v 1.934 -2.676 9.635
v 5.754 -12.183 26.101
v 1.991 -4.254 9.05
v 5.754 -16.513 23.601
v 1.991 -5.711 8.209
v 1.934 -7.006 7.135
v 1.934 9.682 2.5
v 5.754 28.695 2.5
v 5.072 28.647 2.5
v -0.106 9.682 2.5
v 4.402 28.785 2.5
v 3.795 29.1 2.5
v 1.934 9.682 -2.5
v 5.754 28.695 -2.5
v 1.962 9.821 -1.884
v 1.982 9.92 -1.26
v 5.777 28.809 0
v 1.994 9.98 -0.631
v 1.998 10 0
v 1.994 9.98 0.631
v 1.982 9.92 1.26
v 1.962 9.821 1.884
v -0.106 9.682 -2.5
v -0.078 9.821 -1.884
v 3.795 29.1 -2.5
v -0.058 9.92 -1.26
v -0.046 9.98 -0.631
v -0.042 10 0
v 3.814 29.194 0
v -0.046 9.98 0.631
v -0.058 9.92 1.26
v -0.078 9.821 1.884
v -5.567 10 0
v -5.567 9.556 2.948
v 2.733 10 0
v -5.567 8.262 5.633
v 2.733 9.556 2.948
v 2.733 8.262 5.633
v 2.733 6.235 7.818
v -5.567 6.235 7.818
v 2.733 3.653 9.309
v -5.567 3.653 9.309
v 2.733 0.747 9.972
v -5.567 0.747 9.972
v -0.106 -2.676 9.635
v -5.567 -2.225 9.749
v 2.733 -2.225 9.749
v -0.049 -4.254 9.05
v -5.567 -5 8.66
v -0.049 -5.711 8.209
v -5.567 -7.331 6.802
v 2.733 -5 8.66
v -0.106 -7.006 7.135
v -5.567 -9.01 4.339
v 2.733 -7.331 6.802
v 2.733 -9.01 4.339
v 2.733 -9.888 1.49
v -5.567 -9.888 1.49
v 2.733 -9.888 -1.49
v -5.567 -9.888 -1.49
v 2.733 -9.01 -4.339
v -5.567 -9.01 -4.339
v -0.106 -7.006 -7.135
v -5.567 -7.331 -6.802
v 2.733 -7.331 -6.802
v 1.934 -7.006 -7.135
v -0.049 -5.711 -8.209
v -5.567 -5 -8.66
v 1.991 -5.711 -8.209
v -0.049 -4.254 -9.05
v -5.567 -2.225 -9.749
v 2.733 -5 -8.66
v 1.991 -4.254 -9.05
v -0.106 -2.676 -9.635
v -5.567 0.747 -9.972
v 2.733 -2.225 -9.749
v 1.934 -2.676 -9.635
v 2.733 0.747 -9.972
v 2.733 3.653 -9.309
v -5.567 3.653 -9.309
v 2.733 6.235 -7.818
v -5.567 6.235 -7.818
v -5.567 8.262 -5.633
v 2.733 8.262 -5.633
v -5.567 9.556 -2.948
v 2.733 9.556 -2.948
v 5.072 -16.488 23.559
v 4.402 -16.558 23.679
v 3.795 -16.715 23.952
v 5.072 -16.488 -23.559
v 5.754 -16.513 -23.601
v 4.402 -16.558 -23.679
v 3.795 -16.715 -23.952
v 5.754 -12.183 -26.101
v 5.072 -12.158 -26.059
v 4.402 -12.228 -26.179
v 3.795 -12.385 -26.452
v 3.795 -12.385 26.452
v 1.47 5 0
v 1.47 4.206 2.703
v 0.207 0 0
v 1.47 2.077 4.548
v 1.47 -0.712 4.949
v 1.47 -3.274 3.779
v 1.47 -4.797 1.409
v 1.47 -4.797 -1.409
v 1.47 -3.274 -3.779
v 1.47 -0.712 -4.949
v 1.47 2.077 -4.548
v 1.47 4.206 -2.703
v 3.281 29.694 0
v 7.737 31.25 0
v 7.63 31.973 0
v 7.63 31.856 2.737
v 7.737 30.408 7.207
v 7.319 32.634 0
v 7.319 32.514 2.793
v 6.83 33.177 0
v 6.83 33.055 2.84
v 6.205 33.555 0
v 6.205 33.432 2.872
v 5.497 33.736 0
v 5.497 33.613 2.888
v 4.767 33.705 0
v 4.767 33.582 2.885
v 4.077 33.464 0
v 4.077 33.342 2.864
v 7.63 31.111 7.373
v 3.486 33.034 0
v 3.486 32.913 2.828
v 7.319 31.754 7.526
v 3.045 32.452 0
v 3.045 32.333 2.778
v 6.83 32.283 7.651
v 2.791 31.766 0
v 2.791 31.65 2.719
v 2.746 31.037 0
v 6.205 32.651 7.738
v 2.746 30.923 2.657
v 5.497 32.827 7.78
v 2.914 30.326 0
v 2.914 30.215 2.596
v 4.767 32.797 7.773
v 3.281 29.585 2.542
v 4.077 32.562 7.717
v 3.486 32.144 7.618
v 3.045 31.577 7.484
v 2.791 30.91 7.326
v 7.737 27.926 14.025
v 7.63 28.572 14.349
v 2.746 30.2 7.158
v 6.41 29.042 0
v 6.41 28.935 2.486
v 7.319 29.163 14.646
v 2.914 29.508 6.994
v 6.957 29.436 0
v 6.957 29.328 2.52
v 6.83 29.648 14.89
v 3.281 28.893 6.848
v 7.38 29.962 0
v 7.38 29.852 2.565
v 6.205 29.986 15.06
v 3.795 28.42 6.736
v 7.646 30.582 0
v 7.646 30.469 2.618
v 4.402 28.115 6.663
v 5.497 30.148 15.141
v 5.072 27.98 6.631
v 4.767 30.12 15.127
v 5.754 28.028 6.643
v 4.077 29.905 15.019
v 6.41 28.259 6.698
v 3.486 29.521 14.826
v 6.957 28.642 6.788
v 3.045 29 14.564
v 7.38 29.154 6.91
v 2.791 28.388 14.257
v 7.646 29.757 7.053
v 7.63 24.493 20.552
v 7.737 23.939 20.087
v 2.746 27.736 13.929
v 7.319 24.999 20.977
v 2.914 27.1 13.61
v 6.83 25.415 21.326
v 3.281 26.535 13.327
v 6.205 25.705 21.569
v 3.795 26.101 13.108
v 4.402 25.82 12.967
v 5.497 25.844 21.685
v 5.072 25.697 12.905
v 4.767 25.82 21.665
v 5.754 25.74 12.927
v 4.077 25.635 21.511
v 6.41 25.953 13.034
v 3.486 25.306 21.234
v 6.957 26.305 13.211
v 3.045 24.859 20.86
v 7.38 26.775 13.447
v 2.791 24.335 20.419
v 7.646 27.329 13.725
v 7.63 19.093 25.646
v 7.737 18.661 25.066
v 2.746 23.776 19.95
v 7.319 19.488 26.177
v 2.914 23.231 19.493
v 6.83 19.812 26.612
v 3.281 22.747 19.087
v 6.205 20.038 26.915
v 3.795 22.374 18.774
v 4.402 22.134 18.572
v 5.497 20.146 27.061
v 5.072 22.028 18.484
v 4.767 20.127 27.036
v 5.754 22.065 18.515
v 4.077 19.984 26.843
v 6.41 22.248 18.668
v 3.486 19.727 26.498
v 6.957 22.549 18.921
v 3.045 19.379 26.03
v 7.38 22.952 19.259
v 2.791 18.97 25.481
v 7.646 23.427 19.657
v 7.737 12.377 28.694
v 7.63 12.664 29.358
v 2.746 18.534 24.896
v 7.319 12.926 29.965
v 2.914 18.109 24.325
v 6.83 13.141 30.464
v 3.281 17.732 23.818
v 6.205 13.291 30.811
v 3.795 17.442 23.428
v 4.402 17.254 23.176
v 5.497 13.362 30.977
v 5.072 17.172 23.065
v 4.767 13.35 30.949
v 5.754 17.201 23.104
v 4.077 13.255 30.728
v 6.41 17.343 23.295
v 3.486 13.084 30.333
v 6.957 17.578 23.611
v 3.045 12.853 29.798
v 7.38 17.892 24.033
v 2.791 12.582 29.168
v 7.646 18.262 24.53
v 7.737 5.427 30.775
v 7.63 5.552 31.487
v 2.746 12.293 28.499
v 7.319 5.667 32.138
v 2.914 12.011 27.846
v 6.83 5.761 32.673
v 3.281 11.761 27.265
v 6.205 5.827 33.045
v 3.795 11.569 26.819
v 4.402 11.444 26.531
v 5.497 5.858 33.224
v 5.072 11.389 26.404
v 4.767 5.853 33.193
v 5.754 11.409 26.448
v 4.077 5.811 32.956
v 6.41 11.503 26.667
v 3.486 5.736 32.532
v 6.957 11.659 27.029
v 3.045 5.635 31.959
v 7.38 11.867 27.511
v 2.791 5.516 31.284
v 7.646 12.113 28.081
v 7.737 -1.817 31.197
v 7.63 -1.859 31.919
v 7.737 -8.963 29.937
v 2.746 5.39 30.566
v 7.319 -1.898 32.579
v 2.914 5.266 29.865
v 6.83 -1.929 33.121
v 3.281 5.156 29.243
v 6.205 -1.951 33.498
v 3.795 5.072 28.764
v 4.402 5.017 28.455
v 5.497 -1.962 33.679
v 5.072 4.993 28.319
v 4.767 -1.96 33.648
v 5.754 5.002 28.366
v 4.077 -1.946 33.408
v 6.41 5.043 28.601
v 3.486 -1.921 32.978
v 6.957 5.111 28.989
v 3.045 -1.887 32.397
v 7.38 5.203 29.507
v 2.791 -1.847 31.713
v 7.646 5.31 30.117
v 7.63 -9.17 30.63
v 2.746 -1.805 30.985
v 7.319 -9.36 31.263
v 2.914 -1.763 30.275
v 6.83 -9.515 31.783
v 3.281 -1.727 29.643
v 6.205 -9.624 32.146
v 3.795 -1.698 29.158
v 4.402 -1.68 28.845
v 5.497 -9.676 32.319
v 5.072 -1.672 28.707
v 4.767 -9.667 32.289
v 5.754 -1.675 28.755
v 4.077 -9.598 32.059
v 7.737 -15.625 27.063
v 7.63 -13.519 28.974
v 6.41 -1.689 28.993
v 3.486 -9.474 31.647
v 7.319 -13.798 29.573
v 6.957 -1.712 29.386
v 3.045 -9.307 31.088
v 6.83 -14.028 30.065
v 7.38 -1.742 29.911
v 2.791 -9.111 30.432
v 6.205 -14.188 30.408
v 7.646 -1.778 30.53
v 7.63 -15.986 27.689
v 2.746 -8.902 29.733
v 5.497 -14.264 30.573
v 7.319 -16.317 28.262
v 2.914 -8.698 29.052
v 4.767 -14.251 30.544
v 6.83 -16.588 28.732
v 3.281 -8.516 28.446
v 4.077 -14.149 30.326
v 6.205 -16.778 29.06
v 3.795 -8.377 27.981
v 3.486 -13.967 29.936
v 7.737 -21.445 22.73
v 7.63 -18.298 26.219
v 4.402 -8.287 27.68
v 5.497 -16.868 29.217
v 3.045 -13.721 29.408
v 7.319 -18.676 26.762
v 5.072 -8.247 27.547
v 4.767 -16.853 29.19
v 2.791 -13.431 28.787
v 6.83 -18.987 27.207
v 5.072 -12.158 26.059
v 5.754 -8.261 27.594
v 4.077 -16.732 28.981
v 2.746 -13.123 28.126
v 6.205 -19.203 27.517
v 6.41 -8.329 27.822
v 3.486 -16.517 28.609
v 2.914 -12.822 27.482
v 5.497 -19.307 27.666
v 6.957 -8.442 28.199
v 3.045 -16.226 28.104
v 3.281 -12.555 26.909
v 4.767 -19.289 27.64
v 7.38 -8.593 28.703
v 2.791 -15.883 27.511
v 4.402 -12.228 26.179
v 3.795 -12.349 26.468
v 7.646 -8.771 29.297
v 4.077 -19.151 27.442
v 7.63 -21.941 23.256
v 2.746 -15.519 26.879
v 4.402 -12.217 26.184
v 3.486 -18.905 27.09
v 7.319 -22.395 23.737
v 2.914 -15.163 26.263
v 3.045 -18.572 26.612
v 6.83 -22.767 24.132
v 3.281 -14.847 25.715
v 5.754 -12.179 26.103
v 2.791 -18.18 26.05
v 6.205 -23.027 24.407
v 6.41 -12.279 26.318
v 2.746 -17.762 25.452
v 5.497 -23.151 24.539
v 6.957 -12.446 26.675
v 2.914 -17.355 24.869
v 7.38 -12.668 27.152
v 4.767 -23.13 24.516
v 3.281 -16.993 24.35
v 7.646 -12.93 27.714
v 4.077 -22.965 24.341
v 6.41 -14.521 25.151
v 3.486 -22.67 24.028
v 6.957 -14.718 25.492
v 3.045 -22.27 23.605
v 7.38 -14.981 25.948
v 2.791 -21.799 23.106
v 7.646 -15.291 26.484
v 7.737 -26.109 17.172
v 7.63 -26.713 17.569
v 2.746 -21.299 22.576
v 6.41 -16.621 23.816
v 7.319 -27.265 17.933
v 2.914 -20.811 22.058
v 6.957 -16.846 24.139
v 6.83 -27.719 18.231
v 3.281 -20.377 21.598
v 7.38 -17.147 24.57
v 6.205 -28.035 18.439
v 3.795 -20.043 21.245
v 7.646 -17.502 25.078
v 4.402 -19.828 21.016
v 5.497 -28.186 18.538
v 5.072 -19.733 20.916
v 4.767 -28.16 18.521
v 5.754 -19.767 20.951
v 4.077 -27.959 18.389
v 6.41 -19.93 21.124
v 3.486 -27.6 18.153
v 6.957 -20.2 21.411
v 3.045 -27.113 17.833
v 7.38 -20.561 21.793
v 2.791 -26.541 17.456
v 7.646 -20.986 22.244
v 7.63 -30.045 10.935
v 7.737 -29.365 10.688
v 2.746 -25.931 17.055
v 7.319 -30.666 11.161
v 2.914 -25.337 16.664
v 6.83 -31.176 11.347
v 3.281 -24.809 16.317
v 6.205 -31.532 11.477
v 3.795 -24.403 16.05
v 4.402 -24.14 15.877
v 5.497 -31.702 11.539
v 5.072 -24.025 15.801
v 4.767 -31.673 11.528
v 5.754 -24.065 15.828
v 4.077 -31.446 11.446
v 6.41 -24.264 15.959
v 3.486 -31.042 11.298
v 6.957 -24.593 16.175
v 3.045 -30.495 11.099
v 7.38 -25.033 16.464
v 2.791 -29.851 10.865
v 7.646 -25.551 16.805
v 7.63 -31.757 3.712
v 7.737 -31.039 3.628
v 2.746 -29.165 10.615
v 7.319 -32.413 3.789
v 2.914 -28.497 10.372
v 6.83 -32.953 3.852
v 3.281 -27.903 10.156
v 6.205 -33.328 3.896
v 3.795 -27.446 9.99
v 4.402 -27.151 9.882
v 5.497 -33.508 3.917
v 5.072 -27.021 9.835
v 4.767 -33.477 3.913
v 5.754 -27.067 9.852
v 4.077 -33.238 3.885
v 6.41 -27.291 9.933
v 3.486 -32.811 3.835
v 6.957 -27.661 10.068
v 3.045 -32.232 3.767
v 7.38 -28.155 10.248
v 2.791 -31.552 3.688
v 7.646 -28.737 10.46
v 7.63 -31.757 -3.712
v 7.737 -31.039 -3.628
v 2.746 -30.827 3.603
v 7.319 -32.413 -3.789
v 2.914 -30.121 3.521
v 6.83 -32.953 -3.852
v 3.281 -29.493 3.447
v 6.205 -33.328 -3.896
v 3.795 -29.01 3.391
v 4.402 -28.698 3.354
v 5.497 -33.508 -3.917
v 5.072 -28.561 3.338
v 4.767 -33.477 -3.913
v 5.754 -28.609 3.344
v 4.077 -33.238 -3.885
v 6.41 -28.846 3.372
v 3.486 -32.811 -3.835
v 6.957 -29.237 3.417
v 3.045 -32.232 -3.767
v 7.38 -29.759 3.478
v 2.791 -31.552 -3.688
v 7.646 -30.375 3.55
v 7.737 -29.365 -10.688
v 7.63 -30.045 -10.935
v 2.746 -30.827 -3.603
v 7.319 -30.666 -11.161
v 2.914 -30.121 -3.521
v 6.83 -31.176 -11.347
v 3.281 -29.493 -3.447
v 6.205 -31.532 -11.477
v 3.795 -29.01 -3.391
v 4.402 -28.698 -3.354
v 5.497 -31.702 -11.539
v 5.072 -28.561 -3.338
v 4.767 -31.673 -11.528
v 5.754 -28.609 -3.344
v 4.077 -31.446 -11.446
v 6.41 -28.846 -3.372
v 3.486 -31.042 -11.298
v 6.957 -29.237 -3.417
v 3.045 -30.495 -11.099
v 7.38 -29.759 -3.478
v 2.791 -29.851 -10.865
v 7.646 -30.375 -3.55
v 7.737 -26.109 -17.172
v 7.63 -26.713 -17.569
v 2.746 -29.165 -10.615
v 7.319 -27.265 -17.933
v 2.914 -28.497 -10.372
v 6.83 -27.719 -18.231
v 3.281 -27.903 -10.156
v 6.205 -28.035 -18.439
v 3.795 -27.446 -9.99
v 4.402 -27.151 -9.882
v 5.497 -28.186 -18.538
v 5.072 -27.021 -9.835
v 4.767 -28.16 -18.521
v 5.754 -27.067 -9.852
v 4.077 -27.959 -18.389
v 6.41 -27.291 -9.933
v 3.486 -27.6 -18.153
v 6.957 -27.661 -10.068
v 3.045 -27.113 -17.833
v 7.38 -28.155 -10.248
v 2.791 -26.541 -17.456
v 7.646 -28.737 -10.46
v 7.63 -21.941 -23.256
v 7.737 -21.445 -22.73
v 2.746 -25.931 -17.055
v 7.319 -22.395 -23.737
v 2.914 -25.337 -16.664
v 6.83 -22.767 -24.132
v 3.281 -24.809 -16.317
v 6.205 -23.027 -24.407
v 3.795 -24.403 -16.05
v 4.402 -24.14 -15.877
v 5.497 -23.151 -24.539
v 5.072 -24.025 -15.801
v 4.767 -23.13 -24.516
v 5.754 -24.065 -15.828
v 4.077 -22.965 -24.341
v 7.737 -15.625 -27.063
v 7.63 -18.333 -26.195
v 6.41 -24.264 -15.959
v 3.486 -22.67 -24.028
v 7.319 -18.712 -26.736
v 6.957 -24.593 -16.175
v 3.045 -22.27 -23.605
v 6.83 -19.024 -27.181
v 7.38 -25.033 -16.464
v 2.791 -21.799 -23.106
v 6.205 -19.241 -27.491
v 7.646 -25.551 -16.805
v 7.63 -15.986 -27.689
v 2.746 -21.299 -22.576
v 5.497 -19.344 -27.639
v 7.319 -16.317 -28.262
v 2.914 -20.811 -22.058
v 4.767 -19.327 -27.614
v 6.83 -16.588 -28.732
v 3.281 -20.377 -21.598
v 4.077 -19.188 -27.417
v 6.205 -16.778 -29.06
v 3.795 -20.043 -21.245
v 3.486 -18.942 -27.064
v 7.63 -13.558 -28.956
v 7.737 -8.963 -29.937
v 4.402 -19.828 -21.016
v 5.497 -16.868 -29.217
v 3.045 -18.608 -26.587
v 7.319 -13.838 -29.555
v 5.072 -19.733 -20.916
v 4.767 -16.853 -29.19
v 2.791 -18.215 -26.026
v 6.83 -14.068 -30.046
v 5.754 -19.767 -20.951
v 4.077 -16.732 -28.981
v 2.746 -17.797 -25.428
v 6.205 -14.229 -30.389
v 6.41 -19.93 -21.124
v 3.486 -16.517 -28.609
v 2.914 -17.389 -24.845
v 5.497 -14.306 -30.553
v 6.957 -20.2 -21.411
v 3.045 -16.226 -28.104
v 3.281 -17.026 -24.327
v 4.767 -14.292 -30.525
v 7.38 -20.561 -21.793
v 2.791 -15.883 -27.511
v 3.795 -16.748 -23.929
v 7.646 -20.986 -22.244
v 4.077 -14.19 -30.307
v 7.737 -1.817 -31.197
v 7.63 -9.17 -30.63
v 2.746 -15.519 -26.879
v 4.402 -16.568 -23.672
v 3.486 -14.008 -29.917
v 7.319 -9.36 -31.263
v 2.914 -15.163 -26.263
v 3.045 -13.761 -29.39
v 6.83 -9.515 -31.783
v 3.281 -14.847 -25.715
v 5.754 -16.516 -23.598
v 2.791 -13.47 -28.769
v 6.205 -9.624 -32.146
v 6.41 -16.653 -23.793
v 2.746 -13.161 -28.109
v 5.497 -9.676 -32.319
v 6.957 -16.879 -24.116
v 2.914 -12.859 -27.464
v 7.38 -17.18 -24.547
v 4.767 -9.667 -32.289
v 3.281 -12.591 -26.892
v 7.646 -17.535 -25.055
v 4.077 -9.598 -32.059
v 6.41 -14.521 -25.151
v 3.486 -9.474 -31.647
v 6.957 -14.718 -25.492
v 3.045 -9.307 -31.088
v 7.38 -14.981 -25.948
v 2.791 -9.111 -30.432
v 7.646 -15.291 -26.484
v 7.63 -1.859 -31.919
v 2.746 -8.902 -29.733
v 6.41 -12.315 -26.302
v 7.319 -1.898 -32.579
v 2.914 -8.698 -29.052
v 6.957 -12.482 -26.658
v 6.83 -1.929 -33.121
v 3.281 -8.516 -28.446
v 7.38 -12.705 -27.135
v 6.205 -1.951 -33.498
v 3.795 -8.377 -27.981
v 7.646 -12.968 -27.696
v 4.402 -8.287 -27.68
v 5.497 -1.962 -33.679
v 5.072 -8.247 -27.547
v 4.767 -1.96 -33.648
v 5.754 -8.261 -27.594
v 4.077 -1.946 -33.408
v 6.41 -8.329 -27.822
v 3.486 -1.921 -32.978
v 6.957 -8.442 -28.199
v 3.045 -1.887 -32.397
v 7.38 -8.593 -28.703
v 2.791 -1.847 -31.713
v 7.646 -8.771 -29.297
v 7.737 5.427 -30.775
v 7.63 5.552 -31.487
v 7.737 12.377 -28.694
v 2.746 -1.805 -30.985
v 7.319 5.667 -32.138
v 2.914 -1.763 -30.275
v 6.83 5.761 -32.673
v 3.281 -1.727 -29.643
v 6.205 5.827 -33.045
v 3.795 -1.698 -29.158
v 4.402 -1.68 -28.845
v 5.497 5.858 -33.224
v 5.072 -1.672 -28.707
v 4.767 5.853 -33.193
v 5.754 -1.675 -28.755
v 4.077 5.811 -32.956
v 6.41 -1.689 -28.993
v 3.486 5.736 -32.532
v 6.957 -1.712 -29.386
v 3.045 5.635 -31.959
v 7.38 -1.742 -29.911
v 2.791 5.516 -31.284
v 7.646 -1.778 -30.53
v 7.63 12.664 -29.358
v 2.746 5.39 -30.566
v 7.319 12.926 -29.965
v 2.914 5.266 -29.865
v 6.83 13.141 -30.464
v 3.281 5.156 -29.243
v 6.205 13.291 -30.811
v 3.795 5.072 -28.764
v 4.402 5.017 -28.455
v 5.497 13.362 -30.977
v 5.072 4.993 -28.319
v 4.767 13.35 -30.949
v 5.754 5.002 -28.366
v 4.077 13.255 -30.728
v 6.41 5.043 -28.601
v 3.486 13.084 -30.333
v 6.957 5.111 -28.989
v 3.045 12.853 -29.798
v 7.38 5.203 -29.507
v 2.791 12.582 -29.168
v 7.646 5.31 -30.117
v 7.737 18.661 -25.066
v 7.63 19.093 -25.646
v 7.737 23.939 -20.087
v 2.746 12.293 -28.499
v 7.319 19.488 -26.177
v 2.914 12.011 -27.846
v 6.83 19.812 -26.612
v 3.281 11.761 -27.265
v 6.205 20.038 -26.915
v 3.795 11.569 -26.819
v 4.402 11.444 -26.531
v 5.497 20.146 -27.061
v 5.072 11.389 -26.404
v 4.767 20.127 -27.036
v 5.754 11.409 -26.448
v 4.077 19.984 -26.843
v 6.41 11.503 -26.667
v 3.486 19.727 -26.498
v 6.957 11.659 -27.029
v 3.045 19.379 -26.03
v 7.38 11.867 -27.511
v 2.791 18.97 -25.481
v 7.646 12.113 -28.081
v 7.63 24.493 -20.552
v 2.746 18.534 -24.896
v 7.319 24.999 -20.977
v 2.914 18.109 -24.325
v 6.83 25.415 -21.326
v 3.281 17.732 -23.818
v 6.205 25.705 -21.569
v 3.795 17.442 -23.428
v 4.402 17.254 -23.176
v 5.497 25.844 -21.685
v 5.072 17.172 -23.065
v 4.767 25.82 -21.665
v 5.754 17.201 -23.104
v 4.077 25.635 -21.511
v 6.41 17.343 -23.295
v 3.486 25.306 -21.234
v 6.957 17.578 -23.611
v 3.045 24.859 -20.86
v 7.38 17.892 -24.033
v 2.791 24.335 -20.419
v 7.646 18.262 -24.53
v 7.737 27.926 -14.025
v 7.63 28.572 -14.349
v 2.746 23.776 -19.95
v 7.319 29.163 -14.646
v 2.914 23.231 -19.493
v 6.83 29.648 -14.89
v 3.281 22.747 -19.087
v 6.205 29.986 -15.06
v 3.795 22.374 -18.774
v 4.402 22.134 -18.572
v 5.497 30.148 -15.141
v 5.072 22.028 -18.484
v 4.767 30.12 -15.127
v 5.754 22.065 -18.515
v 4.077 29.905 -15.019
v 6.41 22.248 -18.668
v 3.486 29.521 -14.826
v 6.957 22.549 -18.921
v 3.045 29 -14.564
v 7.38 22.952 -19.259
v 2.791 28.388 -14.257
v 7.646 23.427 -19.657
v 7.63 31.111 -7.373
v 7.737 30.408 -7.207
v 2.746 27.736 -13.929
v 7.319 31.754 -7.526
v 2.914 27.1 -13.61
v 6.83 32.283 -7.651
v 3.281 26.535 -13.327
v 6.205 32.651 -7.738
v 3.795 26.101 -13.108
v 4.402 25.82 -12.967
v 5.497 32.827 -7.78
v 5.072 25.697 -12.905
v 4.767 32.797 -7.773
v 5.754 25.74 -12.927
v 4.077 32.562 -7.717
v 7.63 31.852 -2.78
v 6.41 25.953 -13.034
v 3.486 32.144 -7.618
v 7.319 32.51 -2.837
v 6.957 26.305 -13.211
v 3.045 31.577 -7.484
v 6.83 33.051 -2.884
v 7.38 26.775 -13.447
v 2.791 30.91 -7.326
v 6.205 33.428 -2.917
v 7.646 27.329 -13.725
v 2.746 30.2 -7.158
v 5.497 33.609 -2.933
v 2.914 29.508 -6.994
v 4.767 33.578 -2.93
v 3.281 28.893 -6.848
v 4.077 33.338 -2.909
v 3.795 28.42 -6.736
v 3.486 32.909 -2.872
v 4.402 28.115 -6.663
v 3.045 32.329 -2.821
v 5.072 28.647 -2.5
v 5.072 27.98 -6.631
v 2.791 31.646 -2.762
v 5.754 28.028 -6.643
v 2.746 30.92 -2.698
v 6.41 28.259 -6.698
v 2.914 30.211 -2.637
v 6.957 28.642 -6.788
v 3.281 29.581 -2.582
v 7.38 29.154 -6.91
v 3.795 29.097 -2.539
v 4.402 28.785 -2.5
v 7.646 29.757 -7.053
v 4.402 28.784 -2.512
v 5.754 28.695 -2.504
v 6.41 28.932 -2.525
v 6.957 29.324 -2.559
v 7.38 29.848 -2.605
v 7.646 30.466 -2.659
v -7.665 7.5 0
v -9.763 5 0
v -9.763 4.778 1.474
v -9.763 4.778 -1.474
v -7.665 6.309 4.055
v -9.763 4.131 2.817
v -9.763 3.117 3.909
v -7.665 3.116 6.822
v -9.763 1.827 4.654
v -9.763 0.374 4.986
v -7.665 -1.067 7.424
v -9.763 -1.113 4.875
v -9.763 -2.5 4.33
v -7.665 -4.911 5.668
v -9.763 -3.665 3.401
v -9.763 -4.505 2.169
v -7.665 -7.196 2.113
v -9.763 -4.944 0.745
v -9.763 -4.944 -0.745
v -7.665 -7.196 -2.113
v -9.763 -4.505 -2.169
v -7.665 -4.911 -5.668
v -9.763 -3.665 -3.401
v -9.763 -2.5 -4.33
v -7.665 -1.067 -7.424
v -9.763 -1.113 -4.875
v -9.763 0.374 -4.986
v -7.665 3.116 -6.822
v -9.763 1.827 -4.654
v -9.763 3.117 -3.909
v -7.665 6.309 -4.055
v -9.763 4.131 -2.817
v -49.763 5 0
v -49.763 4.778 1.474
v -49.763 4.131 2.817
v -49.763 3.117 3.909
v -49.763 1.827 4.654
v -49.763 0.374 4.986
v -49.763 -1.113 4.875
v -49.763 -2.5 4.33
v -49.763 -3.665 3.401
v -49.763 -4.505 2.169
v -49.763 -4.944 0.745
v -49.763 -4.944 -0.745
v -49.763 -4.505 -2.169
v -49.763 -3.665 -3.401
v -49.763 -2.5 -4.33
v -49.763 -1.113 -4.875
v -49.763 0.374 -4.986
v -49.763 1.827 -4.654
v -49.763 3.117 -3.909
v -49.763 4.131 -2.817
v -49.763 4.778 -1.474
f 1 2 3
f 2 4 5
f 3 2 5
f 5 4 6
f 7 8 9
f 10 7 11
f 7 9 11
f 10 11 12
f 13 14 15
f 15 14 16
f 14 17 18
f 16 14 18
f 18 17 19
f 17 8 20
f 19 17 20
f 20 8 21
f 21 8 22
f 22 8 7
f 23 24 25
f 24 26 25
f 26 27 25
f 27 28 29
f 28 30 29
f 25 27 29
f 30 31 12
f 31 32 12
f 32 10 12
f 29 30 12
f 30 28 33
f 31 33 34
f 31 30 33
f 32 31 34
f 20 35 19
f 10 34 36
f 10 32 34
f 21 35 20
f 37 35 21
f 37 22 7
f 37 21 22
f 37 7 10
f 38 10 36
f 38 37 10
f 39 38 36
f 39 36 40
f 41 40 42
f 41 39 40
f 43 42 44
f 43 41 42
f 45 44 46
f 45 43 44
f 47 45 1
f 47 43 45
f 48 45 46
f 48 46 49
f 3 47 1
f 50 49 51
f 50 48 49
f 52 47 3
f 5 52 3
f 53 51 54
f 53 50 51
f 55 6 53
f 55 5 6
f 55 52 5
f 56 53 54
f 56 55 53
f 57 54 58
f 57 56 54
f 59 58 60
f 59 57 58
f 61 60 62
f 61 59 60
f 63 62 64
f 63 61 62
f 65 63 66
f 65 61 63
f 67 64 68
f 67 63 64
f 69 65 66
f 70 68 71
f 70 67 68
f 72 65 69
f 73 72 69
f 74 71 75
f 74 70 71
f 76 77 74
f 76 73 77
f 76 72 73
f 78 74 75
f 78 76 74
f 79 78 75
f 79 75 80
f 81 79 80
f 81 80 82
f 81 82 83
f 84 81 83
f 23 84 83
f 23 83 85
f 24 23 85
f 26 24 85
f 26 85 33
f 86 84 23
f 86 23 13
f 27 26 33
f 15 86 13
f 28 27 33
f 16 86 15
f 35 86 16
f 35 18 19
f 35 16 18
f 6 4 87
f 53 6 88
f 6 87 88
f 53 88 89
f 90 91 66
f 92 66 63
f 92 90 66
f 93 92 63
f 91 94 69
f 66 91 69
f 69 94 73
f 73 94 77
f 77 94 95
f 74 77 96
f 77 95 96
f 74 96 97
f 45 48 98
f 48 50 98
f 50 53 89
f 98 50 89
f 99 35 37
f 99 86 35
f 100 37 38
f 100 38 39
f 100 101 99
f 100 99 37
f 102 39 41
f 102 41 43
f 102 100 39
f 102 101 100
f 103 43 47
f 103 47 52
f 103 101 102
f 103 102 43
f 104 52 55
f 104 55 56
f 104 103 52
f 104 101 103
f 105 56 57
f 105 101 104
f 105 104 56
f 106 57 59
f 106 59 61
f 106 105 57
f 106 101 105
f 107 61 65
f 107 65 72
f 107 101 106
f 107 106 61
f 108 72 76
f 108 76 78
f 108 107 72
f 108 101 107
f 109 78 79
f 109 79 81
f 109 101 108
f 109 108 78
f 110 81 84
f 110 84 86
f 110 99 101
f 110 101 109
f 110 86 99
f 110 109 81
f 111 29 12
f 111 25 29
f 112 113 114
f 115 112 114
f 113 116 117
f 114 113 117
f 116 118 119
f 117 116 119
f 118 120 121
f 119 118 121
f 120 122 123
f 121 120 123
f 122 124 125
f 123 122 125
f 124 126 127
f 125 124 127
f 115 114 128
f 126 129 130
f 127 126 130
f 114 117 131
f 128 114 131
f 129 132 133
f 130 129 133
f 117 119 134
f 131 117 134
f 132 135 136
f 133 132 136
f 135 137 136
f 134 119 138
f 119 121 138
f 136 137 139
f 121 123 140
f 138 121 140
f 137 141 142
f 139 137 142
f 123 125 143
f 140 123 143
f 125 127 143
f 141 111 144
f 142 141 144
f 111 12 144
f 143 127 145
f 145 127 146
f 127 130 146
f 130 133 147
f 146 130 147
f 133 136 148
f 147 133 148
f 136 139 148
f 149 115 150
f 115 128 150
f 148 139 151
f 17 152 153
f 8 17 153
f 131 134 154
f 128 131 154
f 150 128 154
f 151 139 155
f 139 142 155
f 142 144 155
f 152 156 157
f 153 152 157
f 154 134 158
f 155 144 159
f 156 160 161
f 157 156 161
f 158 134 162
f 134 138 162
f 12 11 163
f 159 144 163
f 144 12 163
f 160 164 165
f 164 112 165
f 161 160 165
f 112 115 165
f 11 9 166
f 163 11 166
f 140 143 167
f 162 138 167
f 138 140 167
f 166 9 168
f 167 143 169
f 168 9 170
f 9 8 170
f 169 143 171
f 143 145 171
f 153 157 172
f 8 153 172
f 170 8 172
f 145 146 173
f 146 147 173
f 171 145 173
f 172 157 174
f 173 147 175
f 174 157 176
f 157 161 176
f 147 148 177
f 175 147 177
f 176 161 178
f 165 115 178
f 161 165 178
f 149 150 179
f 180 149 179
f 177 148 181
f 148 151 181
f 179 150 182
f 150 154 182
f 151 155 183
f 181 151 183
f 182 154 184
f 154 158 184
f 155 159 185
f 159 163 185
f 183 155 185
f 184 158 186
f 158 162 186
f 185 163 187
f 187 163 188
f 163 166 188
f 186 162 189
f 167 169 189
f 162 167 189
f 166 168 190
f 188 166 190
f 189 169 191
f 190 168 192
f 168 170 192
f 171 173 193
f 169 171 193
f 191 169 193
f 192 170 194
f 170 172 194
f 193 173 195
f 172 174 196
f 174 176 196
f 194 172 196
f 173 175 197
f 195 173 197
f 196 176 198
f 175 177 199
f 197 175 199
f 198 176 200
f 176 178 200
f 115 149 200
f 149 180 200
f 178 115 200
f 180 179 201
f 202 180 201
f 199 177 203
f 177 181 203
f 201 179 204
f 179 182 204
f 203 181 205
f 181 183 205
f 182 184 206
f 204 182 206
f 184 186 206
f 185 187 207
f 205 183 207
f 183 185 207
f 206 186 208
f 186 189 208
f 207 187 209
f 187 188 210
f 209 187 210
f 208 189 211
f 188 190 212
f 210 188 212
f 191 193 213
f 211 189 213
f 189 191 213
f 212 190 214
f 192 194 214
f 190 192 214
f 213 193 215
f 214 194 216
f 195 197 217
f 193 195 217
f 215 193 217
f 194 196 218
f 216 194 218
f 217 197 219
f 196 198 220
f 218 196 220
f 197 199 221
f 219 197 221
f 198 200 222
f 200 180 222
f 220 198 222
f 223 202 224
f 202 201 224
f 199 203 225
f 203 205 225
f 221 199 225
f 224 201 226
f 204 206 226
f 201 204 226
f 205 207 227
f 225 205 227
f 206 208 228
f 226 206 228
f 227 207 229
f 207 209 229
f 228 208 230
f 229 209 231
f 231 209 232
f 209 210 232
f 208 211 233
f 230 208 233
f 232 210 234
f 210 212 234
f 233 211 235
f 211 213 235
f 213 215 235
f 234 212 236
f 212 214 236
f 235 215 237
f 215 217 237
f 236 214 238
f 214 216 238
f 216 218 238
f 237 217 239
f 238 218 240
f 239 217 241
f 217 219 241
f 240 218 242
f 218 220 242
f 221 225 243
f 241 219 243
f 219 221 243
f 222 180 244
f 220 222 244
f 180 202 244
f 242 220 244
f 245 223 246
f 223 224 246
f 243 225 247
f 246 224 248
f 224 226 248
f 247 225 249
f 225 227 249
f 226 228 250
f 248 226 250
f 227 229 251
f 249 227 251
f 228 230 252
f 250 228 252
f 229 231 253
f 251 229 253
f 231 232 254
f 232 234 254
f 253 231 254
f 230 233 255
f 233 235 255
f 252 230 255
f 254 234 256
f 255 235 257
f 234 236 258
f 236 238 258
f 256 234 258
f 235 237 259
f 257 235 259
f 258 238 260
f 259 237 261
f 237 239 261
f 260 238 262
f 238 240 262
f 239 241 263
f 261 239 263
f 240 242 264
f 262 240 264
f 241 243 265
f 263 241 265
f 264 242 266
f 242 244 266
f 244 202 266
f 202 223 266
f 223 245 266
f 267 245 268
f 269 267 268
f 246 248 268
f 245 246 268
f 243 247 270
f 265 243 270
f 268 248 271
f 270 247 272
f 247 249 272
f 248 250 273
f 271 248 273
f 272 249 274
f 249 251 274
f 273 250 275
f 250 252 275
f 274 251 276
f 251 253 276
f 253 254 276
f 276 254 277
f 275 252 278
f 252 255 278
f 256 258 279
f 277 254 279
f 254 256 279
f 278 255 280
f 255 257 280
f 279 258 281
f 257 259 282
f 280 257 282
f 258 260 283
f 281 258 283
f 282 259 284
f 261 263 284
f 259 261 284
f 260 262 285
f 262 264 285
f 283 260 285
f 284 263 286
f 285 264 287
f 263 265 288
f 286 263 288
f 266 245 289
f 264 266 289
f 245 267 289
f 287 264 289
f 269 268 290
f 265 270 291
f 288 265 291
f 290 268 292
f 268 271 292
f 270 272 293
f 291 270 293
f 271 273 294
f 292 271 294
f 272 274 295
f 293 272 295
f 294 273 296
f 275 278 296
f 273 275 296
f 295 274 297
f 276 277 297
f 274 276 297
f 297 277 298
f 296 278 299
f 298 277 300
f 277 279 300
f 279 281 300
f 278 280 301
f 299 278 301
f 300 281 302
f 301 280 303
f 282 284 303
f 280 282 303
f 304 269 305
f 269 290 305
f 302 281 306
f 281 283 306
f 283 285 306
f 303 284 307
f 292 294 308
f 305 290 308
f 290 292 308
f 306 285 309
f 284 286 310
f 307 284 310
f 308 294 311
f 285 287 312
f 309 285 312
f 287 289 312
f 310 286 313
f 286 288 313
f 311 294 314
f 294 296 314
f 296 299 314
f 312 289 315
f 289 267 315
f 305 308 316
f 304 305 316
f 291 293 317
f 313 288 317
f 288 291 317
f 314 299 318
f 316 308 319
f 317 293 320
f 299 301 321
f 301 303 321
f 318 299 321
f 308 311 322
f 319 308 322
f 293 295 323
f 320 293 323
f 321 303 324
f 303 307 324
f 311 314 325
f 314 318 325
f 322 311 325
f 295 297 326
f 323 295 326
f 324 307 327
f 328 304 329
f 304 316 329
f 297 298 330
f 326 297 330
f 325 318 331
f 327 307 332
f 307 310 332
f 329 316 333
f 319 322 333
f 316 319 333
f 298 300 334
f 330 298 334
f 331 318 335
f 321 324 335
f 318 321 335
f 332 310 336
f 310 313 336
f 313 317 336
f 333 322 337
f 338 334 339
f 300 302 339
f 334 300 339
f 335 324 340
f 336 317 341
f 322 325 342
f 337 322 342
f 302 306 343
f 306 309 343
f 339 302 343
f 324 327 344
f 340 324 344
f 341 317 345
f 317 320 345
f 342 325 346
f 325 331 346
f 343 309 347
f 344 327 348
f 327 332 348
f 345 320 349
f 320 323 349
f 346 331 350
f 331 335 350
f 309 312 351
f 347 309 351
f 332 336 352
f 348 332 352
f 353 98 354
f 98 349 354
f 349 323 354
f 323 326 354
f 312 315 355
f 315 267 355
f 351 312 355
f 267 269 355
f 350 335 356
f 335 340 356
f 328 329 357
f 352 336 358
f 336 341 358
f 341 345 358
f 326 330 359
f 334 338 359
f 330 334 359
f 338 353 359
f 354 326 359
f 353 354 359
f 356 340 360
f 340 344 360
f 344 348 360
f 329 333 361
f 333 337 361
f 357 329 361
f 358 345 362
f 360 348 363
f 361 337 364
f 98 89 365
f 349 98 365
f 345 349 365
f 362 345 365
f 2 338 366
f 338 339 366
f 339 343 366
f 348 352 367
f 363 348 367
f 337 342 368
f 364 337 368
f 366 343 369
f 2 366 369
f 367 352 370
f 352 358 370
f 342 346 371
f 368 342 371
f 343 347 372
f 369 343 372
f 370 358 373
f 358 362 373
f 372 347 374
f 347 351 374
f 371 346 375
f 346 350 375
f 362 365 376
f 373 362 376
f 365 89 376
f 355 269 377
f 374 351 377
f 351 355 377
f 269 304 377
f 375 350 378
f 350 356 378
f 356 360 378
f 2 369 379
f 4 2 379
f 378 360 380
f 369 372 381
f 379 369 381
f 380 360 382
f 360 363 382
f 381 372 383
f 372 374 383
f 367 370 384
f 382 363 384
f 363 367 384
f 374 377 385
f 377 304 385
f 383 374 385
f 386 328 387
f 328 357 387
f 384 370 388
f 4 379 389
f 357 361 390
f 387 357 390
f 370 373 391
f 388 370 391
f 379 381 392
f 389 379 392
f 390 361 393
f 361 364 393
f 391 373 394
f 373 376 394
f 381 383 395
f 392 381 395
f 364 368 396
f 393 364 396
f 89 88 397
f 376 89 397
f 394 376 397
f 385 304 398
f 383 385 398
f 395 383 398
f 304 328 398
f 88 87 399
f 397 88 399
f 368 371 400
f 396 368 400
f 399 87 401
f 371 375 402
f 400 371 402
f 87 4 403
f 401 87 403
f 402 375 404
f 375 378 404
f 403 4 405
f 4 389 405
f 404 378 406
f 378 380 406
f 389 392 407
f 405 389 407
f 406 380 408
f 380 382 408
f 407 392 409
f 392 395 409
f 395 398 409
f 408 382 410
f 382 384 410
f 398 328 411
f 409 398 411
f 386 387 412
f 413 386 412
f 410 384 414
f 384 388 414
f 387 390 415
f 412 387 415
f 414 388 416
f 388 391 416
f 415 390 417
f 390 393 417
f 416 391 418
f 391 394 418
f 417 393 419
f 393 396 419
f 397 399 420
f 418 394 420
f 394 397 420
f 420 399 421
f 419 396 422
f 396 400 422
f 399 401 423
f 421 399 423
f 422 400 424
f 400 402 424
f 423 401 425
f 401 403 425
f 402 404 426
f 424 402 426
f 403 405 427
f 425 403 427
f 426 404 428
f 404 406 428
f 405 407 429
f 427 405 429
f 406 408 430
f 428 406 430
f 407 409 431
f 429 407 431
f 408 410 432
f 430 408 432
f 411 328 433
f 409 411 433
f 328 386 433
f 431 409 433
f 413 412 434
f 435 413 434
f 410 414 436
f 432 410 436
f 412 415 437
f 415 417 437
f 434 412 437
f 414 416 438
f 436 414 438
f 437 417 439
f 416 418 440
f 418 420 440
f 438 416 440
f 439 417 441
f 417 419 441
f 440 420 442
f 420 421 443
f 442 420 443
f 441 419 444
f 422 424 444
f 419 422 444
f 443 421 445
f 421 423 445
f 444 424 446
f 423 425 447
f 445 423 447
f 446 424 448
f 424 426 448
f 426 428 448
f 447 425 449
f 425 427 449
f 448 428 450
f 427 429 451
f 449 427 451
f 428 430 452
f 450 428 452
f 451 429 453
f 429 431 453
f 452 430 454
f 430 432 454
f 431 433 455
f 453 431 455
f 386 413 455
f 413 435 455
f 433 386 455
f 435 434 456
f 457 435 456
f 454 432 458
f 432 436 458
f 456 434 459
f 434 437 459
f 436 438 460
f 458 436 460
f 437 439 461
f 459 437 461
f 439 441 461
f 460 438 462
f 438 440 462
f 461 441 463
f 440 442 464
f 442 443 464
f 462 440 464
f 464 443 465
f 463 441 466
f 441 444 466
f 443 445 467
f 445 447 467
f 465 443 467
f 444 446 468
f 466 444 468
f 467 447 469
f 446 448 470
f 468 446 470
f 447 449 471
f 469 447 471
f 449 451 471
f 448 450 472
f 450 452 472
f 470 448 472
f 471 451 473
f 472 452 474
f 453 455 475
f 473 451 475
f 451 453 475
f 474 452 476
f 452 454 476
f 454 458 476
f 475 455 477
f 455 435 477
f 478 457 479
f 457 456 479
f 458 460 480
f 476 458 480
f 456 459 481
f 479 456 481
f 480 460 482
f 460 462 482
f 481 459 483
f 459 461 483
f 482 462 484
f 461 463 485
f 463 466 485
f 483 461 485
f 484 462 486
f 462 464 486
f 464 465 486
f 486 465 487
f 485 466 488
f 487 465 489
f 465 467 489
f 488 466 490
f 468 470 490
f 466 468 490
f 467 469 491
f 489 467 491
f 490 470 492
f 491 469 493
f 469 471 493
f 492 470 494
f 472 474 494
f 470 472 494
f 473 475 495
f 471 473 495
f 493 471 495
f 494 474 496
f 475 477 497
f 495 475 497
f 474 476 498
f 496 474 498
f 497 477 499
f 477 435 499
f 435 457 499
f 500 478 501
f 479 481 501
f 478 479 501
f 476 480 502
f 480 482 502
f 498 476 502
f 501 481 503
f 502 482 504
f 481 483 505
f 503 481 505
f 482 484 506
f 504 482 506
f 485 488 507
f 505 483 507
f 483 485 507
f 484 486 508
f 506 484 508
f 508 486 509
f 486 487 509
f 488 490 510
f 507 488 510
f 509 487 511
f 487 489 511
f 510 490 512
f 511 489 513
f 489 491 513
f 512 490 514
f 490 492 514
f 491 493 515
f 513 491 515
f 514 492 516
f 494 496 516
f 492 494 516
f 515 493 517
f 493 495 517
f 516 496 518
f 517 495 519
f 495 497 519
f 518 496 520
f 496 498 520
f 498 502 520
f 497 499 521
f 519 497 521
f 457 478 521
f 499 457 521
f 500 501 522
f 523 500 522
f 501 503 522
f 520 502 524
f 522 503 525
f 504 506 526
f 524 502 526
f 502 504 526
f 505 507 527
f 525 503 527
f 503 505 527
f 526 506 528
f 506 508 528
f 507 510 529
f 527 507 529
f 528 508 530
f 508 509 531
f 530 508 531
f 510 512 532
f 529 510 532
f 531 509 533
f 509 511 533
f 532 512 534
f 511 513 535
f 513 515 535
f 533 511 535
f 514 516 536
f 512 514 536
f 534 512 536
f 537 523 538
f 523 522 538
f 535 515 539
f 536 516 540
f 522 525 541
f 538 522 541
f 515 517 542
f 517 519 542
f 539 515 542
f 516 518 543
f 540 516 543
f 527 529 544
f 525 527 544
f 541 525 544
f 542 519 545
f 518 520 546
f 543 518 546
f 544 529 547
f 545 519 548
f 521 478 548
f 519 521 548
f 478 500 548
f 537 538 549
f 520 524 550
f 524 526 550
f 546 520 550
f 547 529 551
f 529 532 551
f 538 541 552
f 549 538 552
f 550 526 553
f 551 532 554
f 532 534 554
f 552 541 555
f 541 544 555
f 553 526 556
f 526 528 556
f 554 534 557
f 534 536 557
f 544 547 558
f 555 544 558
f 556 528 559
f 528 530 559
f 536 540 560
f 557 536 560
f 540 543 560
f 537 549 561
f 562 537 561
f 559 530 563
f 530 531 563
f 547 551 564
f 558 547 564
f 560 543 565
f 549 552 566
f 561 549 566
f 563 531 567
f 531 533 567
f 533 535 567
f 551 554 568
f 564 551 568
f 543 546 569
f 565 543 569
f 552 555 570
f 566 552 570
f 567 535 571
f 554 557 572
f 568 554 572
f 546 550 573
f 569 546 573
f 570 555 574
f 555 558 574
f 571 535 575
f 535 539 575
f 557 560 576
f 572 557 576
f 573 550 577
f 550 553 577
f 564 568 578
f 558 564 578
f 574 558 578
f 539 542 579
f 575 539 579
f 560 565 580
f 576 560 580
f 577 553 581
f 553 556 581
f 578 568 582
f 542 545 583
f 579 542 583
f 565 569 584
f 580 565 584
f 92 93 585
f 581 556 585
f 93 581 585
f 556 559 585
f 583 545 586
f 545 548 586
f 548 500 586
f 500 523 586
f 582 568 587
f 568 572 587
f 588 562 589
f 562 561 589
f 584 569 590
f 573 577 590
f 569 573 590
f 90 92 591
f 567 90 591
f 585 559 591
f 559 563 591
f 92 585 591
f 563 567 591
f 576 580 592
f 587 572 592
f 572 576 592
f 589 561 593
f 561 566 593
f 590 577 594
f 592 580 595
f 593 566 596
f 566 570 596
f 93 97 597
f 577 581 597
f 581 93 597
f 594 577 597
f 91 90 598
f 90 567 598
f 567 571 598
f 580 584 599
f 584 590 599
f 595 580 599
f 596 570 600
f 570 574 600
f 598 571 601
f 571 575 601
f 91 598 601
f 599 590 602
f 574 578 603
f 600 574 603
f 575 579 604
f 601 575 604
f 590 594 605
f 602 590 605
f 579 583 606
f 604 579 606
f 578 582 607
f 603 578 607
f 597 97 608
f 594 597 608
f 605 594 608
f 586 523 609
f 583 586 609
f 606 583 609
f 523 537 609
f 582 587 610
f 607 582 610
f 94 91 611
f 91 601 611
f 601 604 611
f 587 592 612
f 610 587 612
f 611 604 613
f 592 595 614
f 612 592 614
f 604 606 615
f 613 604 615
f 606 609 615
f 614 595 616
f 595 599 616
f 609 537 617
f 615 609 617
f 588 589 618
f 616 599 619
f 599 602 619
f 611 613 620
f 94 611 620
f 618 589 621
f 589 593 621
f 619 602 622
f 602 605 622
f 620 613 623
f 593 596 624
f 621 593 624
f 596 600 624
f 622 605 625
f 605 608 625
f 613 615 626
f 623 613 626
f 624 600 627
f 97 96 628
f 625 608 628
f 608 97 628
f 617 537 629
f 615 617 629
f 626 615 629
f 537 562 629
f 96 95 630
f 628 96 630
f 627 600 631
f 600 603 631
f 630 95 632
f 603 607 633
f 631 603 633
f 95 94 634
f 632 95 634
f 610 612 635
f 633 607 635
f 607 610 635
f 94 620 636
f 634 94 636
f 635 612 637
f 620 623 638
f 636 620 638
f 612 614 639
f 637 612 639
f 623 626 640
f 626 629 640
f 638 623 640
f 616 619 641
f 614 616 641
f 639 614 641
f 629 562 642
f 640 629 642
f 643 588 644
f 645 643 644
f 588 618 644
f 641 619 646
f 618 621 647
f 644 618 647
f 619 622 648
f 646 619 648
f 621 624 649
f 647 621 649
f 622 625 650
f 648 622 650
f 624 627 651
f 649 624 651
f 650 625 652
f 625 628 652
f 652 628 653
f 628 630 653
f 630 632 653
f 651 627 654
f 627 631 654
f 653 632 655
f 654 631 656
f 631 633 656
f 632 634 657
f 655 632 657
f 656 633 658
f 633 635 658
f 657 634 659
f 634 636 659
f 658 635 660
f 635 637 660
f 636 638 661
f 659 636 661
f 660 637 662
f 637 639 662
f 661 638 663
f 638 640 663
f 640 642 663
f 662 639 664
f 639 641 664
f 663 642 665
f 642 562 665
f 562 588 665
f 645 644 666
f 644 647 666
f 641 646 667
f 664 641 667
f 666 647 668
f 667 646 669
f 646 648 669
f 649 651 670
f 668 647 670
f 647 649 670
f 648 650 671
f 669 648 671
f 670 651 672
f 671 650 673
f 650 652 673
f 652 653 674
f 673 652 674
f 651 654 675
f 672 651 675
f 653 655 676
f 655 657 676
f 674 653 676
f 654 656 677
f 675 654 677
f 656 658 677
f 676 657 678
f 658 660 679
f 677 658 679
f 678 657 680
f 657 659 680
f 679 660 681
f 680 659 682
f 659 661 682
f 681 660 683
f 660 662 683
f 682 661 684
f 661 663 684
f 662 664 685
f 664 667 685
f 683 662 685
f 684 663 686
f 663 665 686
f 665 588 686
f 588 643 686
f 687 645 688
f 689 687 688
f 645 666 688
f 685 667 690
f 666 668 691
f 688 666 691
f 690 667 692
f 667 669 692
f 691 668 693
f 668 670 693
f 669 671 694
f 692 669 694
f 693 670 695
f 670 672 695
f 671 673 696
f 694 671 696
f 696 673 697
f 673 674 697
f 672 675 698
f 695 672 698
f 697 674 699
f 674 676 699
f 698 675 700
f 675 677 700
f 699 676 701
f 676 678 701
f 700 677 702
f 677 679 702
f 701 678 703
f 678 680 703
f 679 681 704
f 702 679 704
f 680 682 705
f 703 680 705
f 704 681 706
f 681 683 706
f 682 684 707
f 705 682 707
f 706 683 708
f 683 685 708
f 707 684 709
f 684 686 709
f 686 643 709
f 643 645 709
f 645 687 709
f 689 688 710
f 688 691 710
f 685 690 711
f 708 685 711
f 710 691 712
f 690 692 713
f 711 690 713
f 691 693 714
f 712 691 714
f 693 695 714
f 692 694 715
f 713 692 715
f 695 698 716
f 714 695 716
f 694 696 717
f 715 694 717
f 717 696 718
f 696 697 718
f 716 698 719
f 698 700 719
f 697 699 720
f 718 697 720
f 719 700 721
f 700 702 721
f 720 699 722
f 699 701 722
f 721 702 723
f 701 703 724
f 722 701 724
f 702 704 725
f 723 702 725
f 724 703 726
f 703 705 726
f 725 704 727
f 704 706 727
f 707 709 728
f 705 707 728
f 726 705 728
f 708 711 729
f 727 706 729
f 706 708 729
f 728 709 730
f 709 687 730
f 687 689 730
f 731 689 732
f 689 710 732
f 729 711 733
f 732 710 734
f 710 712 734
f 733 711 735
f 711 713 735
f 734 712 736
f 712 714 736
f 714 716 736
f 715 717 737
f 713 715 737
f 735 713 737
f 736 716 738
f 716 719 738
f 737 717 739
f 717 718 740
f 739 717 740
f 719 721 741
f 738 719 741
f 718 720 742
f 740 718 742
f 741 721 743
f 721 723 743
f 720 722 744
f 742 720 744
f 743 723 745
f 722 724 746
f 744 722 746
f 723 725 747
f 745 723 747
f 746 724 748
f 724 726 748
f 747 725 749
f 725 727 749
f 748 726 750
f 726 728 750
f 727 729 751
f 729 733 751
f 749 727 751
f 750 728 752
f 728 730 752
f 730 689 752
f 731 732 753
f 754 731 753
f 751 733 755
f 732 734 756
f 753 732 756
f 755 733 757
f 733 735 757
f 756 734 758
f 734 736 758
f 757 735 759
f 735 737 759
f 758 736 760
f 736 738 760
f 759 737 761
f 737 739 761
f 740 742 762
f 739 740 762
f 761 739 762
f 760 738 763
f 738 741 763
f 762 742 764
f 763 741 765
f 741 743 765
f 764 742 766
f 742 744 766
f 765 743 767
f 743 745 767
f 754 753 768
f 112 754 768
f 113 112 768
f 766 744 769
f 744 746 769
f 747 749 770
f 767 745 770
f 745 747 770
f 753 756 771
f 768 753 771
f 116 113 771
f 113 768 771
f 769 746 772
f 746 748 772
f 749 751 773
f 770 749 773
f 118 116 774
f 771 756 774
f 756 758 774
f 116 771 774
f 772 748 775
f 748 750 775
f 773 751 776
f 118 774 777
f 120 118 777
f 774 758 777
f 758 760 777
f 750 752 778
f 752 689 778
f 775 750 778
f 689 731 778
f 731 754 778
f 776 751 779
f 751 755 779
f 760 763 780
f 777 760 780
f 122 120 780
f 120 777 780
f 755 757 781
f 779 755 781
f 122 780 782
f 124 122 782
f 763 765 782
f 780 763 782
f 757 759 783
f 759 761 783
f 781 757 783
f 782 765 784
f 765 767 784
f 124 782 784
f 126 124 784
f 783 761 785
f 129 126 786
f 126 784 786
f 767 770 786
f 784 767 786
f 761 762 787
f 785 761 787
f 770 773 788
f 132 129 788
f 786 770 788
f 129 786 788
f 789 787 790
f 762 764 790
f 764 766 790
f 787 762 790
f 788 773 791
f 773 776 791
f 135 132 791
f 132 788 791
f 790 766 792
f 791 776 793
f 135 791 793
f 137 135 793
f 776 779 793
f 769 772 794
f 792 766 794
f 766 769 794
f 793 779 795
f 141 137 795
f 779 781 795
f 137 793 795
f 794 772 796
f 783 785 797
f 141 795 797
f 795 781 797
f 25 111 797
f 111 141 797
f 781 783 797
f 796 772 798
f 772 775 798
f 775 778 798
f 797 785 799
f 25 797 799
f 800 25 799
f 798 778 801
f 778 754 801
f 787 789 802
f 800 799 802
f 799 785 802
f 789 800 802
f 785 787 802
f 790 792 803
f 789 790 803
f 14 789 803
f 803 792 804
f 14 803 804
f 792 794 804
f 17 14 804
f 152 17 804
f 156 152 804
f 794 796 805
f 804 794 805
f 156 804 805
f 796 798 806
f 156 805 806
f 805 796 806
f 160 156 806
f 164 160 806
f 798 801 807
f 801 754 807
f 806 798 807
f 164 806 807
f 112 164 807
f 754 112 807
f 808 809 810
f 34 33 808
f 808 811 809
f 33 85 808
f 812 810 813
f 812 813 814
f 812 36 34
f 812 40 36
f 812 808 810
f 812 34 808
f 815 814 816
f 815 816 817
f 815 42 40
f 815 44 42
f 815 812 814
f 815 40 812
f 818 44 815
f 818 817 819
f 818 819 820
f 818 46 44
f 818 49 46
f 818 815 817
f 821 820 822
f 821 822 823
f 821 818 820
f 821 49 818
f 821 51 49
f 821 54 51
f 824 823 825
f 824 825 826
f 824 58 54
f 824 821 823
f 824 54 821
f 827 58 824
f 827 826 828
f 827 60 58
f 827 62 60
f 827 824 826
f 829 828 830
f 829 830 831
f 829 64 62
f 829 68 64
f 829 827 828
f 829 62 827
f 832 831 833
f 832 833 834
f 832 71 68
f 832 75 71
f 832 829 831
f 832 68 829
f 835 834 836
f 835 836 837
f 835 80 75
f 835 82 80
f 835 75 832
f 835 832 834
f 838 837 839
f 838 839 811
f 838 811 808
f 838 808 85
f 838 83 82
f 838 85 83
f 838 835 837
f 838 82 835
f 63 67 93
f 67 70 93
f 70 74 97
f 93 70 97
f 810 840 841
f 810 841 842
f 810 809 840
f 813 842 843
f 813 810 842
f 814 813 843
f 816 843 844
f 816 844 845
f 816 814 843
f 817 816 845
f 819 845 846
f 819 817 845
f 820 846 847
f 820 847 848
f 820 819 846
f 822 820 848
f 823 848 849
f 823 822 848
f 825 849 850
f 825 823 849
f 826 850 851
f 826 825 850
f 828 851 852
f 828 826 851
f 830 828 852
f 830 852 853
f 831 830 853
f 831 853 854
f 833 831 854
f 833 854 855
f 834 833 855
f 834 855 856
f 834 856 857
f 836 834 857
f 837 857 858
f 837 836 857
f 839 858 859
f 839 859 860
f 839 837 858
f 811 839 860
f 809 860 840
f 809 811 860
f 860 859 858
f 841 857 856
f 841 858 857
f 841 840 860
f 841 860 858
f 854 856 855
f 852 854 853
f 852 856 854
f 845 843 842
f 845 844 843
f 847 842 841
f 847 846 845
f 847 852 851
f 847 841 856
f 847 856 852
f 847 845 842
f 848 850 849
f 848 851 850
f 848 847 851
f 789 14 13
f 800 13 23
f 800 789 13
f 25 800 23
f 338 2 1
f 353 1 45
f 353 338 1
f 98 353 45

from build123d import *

# Parameters (mm, degrees)
SKETCH2_R           = 2.5
BOSS_EXTRUDE1_DEPTH = 2.5
CIRPATTERN1_COUNT   = 3


with BuildPart() as part:
    # Sketch1 → Revolve1 (revolve)
    with BuildSketch(Plane.XY):
        Polygon((-49.762825818, 0), (-49.762825818, 5), (-9.762825818, 5), (-5.567327662, 10), (2.732672338, 10), (0.206925517, 0), align=None)
    revolve(axis=Axis((-73.695652174, 0, 0), (1, 0, 0)))



with BuildPart() as body_2:
    # Sketch2 → Revolve2 (revolve)
    with BuildSketch(Plane.XY):
        with Locations((5.237174182, 31.25)):
            Circle(SKETCH2_R)
    revolve(axis=Axis((-155.619016335, 0, 0), (1, 0, 0)))


with BuildPart() as part_1:
    add(part.part)

    add(body_2.part)  # Boss-Extrude1 merges body 2
    # Sketch3 → Boss-Extrude1 (add, symmetric)
    with BuildSketch(Plane.XY):
        Polygon((1.837174182, 9.2), (-0.202790977, 9.2), (4.217209023, 31.2), (6.257174182, 31.2), align=None)
    boss_extrude1 = extrude(amount=BOSS_EXTRUDE1_DEPTH, both=True)

    # CirPattern1: Boss-Extrude1 ×3 about axis
    cirpattern1_axis = Axis((0, 0, 0), (1, 0, 0))
    for i in range(1, CIRPATTERN1_COUNT):
        add(boss_extrude1.rotate(cirpattern1_axis, i * 360 / CIRPATTERN1_COUNT))


solid = part_1.part
